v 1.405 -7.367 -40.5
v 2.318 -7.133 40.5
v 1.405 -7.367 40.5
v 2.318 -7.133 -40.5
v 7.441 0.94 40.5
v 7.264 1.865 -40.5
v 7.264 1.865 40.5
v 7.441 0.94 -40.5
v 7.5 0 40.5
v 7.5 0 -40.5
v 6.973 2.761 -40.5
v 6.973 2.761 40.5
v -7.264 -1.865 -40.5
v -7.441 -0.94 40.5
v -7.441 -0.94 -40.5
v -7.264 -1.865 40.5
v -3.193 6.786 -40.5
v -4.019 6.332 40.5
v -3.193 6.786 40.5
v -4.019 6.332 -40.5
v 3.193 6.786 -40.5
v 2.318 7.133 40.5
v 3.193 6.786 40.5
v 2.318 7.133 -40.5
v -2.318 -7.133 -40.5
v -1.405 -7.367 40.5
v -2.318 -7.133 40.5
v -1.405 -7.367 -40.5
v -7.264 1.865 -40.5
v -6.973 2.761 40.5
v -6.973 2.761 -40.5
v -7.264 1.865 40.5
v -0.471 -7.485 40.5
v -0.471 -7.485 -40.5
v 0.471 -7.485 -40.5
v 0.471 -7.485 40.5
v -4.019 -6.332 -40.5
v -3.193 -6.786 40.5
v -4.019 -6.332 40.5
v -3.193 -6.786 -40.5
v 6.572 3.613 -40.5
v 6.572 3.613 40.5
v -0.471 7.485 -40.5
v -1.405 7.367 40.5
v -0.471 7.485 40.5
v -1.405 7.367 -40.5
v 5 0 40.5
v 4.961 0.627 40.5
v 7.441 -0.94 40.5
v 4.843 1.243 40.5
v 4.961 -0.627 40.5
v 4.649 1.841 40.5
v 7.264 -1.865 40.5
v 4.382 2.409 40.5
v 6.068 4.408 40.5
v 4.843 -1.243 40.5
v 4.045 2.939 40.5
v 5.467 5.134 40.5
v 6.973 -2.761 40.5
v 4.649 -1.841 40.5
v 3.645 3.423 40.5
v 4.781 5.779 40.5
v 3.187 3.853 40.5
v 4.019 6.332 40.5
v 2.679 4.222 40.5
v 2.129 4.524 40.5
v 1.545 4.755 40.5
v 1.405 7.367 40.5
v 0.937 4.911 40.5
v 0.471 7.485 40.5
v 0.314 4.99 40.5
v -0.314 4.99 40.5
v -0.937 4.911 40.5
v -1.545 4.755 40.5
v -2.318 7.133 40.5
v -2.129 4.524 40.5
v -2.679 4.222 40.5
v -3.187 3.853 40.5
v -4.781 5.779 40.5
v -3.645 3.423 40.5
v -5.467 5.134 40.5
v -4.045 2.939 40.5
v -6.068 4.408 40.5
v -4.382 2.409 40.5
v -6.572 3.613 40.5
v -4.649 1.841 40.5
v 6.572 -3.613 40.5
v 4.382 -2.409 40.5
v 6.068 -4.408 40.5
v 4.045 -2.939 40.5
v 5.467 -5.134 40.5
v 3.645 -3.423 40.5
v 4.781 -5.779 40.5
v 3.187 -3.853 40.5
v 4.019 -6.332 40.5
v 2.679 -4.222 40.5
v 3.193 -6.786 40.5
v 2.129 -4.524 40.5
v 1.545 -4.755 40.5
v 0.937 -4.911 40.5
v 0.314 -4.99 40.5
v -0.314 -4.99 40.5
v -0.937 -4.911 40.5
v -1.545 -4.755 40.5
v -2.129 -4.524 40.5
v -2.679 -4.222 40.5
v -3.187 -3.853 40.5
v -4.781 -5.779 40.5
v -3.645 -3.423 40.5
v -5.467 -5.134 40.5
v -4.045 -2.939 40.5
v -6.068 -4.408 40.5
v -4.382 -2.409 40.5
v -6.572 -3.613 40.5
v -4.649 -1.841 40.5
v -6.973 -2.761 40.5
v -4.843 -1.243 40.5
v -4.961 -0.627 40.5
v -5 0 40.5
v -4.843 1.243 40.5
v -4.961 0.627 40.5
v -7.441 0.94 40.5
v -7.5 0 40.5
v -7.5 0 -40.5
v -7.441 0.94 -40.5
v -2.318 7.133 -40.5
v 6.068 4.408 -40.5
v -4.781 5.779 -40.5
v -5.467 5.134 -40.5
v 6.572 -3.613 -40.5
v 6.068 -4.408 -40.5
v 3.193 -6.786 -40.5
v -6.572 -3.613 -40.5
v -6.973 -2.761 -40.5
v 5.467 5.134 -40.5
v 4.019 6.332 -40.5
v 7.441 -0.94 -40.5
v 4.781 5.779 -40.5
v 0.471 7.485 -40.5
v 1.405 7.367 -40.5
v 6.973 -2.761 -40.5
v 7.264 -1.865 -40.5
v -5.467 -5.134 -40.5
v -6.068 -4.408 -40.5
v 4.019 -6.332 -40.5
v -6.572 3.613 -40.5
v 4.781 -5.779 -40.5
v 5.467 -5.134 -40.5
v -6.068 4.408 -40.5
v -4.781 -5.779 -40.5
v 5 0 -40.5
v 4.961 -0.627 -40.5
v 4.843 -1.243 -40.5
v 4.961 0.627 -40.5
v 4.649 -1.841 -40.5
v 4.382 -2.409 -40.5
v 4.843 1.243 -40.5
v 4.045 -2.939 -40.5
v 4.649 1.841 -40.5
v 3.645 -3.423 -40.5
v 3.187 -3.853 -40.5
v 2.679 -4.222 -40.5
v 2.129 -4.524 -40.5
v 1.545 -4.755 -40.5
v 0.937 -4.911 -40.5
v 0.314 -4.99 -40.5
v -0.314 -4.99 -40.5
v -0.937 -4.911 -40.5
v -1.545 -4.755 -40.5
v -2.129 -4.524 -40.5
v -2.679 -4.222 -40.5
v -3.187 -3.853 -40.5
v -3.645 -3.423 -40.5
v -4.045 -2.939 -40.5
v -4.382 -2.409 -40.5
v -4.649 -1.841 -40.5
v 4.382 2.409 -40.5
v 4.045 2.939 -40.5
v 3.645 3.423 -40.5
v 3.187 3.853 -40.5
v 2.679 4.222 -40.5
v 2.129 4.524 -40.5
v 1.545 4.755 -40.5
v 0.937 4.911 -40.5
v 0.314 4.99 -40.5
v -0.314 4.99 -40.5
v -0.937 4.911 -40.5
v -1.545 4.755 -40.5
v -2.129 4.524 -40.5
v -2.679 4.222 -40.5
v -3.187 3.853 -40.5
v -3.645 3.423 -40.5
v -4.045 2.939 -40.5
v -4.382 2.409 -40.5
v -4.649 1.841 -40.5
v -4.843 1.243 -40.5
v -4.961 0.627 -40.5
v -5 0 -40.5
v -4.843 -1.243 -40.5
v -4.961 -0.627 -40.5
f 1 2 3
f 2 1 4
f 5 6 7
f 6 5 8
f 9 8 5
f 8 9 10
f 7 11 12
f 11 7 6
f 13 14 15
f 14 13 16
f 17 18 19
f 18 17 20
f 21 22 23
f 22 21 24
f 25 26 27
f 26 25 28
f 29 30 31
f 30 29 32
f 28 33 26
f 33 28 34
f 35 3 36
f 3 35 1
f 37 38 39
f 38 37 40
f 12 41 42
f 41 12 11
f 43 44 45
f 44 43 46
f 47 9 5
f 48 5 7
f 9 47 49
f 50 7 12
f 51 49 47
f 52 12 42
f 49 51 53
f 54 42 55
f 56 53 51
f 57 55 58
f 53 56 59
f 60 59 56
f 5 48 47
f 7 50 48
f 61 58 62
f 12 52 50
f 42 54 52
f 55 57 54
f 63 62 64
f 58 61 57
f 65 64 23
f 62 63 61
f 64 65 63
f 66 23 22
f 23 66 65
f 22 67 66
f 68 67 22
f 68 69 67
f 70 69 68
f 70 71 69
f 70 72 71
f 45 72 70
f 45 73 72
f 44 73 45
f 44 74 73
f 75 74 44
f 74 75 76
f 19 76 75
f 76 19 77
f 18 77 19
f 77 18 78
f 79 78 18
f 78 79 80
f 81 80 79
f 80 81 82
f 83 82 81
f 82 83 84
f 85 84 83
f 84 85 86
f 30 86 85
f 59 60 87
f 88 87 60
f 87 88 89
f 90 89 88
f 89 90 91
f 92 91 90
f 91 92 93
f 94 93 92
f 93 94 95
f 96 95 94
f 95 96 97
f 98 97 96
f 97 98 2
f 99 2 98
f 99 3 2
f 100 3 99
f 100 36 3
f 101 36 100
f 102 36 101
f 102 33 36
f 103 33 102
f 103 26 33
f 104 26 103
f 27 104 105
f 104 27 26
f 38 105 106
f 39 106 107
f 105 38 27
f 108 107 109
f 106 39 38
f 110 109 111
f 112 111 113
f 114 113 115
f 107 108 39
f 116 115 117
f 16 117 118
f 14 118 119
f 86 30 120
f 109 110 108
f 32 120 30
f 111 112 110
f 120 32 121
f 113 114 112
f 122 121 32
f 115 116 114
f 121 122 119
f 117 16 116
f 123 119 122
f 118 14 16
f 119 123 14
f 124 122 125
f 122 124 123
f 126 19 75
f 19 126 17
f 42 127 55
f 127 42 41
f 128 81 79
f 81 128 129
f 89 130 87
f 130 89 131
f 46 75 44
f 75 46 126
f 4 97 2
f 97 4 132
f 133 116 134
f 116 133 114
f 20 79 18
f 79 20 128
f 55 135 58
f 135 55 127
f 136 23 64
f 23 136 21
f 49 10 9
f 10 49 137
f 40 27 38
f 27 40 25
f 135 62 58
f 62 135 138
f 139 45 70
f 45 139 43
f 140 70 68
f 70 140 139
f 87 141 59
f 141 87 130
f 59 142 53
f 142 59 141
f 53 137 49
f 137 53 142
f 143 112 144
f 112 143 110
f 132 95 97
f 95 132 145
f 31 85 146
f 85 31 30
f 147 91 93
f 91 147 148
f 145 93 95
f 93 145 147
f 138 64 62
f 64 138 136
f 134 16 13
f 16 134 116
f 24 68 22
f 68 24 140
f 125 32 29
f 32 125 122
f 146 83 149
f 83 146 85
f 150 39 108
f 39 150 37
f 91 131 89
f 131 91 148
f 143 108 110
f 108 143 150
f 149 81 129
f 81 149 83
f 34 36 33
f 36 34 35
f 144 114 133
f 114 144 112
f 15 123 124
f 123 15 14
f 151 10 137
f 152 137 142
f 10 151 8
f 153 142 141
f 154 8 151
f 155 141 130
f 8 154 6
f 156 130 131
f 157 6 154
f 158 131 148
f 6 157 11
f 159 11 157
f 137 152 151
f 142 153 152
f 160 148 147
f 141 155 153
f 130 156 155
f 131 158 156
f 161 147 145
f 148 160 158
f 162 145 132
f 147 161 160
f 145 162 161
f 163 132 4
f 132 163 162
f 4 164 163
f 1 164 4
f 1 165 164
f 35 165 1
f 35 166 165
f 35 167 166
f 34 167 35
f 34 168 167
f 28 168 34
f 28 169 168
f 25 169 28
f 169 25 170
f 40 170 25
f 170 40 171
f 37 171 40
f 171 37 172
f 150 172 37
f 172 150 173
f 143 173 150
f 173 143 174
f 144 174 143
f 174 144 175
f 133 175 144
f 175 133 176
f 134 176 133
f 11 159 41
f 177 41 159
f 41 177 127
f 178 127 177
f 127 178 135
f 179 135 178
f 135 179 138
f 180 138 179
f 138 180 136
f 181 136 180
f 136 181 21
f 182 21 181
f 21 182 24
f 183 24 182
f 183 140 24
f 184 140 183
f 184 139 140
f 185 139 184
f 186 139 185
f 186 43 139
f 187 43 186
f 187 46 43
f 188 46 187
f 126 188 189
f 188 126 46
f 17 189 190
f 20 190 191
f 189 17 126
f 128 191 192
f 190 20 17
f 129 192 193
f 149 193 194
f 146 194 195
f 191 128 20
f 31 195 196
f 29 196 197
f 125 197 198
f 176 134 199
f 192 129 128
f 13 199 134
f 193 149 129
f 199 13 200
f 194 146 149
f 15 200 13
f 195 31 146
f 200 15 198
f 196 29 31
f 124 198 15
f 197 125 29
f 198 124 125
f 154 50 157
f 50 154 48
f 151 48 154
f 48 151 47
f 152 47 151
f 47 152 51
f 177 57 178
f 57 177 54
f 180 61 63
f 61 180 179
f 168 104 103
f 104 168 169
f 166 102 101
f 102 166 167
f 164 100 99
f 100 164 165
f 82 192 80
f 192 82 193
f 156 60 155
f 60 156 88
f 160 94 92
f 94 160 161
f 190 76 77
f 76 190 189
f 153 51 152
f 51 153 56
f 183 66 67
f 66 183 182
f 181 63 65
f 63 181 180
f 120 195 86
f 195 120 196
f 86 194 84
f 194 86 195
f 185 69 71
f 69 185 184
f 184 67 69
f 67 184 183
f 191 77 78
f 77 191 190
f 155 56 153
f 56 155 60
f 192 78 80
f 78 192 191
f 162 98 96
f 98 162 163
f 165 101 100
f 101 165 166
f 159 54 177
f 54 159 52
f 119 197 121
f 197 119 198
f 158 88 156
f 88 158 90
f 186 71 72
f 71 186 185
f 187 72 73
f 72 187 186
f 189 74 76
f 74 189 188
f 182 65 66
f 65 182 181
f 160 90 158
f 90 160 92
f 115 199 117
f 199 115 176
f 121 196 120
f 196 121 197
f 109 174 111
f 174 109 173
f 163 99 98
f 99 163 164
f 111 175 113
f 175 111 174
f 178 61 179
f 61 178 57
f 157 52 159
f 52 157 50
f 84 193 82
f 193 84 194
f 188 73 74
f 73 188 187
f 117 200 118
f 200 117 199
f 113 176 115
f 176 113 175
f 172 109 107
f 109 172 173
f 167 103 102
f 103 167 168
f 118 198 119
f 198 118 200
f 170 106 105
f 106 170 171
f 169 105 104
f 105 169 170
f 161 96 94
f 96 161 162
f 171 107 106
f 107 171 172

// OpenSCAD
$fn = 50;


difference() {
	union() {
		translate(v = [0, 0, -40.5000000000]) {
			cylinder(h = 81, r = 7.5000000000);
		}
	}
	union() {
		translate(v = [0, 0, -100.0000000000]) {
			cylinder(h = 200, r = 5.0000000000);
		}
	}
}
